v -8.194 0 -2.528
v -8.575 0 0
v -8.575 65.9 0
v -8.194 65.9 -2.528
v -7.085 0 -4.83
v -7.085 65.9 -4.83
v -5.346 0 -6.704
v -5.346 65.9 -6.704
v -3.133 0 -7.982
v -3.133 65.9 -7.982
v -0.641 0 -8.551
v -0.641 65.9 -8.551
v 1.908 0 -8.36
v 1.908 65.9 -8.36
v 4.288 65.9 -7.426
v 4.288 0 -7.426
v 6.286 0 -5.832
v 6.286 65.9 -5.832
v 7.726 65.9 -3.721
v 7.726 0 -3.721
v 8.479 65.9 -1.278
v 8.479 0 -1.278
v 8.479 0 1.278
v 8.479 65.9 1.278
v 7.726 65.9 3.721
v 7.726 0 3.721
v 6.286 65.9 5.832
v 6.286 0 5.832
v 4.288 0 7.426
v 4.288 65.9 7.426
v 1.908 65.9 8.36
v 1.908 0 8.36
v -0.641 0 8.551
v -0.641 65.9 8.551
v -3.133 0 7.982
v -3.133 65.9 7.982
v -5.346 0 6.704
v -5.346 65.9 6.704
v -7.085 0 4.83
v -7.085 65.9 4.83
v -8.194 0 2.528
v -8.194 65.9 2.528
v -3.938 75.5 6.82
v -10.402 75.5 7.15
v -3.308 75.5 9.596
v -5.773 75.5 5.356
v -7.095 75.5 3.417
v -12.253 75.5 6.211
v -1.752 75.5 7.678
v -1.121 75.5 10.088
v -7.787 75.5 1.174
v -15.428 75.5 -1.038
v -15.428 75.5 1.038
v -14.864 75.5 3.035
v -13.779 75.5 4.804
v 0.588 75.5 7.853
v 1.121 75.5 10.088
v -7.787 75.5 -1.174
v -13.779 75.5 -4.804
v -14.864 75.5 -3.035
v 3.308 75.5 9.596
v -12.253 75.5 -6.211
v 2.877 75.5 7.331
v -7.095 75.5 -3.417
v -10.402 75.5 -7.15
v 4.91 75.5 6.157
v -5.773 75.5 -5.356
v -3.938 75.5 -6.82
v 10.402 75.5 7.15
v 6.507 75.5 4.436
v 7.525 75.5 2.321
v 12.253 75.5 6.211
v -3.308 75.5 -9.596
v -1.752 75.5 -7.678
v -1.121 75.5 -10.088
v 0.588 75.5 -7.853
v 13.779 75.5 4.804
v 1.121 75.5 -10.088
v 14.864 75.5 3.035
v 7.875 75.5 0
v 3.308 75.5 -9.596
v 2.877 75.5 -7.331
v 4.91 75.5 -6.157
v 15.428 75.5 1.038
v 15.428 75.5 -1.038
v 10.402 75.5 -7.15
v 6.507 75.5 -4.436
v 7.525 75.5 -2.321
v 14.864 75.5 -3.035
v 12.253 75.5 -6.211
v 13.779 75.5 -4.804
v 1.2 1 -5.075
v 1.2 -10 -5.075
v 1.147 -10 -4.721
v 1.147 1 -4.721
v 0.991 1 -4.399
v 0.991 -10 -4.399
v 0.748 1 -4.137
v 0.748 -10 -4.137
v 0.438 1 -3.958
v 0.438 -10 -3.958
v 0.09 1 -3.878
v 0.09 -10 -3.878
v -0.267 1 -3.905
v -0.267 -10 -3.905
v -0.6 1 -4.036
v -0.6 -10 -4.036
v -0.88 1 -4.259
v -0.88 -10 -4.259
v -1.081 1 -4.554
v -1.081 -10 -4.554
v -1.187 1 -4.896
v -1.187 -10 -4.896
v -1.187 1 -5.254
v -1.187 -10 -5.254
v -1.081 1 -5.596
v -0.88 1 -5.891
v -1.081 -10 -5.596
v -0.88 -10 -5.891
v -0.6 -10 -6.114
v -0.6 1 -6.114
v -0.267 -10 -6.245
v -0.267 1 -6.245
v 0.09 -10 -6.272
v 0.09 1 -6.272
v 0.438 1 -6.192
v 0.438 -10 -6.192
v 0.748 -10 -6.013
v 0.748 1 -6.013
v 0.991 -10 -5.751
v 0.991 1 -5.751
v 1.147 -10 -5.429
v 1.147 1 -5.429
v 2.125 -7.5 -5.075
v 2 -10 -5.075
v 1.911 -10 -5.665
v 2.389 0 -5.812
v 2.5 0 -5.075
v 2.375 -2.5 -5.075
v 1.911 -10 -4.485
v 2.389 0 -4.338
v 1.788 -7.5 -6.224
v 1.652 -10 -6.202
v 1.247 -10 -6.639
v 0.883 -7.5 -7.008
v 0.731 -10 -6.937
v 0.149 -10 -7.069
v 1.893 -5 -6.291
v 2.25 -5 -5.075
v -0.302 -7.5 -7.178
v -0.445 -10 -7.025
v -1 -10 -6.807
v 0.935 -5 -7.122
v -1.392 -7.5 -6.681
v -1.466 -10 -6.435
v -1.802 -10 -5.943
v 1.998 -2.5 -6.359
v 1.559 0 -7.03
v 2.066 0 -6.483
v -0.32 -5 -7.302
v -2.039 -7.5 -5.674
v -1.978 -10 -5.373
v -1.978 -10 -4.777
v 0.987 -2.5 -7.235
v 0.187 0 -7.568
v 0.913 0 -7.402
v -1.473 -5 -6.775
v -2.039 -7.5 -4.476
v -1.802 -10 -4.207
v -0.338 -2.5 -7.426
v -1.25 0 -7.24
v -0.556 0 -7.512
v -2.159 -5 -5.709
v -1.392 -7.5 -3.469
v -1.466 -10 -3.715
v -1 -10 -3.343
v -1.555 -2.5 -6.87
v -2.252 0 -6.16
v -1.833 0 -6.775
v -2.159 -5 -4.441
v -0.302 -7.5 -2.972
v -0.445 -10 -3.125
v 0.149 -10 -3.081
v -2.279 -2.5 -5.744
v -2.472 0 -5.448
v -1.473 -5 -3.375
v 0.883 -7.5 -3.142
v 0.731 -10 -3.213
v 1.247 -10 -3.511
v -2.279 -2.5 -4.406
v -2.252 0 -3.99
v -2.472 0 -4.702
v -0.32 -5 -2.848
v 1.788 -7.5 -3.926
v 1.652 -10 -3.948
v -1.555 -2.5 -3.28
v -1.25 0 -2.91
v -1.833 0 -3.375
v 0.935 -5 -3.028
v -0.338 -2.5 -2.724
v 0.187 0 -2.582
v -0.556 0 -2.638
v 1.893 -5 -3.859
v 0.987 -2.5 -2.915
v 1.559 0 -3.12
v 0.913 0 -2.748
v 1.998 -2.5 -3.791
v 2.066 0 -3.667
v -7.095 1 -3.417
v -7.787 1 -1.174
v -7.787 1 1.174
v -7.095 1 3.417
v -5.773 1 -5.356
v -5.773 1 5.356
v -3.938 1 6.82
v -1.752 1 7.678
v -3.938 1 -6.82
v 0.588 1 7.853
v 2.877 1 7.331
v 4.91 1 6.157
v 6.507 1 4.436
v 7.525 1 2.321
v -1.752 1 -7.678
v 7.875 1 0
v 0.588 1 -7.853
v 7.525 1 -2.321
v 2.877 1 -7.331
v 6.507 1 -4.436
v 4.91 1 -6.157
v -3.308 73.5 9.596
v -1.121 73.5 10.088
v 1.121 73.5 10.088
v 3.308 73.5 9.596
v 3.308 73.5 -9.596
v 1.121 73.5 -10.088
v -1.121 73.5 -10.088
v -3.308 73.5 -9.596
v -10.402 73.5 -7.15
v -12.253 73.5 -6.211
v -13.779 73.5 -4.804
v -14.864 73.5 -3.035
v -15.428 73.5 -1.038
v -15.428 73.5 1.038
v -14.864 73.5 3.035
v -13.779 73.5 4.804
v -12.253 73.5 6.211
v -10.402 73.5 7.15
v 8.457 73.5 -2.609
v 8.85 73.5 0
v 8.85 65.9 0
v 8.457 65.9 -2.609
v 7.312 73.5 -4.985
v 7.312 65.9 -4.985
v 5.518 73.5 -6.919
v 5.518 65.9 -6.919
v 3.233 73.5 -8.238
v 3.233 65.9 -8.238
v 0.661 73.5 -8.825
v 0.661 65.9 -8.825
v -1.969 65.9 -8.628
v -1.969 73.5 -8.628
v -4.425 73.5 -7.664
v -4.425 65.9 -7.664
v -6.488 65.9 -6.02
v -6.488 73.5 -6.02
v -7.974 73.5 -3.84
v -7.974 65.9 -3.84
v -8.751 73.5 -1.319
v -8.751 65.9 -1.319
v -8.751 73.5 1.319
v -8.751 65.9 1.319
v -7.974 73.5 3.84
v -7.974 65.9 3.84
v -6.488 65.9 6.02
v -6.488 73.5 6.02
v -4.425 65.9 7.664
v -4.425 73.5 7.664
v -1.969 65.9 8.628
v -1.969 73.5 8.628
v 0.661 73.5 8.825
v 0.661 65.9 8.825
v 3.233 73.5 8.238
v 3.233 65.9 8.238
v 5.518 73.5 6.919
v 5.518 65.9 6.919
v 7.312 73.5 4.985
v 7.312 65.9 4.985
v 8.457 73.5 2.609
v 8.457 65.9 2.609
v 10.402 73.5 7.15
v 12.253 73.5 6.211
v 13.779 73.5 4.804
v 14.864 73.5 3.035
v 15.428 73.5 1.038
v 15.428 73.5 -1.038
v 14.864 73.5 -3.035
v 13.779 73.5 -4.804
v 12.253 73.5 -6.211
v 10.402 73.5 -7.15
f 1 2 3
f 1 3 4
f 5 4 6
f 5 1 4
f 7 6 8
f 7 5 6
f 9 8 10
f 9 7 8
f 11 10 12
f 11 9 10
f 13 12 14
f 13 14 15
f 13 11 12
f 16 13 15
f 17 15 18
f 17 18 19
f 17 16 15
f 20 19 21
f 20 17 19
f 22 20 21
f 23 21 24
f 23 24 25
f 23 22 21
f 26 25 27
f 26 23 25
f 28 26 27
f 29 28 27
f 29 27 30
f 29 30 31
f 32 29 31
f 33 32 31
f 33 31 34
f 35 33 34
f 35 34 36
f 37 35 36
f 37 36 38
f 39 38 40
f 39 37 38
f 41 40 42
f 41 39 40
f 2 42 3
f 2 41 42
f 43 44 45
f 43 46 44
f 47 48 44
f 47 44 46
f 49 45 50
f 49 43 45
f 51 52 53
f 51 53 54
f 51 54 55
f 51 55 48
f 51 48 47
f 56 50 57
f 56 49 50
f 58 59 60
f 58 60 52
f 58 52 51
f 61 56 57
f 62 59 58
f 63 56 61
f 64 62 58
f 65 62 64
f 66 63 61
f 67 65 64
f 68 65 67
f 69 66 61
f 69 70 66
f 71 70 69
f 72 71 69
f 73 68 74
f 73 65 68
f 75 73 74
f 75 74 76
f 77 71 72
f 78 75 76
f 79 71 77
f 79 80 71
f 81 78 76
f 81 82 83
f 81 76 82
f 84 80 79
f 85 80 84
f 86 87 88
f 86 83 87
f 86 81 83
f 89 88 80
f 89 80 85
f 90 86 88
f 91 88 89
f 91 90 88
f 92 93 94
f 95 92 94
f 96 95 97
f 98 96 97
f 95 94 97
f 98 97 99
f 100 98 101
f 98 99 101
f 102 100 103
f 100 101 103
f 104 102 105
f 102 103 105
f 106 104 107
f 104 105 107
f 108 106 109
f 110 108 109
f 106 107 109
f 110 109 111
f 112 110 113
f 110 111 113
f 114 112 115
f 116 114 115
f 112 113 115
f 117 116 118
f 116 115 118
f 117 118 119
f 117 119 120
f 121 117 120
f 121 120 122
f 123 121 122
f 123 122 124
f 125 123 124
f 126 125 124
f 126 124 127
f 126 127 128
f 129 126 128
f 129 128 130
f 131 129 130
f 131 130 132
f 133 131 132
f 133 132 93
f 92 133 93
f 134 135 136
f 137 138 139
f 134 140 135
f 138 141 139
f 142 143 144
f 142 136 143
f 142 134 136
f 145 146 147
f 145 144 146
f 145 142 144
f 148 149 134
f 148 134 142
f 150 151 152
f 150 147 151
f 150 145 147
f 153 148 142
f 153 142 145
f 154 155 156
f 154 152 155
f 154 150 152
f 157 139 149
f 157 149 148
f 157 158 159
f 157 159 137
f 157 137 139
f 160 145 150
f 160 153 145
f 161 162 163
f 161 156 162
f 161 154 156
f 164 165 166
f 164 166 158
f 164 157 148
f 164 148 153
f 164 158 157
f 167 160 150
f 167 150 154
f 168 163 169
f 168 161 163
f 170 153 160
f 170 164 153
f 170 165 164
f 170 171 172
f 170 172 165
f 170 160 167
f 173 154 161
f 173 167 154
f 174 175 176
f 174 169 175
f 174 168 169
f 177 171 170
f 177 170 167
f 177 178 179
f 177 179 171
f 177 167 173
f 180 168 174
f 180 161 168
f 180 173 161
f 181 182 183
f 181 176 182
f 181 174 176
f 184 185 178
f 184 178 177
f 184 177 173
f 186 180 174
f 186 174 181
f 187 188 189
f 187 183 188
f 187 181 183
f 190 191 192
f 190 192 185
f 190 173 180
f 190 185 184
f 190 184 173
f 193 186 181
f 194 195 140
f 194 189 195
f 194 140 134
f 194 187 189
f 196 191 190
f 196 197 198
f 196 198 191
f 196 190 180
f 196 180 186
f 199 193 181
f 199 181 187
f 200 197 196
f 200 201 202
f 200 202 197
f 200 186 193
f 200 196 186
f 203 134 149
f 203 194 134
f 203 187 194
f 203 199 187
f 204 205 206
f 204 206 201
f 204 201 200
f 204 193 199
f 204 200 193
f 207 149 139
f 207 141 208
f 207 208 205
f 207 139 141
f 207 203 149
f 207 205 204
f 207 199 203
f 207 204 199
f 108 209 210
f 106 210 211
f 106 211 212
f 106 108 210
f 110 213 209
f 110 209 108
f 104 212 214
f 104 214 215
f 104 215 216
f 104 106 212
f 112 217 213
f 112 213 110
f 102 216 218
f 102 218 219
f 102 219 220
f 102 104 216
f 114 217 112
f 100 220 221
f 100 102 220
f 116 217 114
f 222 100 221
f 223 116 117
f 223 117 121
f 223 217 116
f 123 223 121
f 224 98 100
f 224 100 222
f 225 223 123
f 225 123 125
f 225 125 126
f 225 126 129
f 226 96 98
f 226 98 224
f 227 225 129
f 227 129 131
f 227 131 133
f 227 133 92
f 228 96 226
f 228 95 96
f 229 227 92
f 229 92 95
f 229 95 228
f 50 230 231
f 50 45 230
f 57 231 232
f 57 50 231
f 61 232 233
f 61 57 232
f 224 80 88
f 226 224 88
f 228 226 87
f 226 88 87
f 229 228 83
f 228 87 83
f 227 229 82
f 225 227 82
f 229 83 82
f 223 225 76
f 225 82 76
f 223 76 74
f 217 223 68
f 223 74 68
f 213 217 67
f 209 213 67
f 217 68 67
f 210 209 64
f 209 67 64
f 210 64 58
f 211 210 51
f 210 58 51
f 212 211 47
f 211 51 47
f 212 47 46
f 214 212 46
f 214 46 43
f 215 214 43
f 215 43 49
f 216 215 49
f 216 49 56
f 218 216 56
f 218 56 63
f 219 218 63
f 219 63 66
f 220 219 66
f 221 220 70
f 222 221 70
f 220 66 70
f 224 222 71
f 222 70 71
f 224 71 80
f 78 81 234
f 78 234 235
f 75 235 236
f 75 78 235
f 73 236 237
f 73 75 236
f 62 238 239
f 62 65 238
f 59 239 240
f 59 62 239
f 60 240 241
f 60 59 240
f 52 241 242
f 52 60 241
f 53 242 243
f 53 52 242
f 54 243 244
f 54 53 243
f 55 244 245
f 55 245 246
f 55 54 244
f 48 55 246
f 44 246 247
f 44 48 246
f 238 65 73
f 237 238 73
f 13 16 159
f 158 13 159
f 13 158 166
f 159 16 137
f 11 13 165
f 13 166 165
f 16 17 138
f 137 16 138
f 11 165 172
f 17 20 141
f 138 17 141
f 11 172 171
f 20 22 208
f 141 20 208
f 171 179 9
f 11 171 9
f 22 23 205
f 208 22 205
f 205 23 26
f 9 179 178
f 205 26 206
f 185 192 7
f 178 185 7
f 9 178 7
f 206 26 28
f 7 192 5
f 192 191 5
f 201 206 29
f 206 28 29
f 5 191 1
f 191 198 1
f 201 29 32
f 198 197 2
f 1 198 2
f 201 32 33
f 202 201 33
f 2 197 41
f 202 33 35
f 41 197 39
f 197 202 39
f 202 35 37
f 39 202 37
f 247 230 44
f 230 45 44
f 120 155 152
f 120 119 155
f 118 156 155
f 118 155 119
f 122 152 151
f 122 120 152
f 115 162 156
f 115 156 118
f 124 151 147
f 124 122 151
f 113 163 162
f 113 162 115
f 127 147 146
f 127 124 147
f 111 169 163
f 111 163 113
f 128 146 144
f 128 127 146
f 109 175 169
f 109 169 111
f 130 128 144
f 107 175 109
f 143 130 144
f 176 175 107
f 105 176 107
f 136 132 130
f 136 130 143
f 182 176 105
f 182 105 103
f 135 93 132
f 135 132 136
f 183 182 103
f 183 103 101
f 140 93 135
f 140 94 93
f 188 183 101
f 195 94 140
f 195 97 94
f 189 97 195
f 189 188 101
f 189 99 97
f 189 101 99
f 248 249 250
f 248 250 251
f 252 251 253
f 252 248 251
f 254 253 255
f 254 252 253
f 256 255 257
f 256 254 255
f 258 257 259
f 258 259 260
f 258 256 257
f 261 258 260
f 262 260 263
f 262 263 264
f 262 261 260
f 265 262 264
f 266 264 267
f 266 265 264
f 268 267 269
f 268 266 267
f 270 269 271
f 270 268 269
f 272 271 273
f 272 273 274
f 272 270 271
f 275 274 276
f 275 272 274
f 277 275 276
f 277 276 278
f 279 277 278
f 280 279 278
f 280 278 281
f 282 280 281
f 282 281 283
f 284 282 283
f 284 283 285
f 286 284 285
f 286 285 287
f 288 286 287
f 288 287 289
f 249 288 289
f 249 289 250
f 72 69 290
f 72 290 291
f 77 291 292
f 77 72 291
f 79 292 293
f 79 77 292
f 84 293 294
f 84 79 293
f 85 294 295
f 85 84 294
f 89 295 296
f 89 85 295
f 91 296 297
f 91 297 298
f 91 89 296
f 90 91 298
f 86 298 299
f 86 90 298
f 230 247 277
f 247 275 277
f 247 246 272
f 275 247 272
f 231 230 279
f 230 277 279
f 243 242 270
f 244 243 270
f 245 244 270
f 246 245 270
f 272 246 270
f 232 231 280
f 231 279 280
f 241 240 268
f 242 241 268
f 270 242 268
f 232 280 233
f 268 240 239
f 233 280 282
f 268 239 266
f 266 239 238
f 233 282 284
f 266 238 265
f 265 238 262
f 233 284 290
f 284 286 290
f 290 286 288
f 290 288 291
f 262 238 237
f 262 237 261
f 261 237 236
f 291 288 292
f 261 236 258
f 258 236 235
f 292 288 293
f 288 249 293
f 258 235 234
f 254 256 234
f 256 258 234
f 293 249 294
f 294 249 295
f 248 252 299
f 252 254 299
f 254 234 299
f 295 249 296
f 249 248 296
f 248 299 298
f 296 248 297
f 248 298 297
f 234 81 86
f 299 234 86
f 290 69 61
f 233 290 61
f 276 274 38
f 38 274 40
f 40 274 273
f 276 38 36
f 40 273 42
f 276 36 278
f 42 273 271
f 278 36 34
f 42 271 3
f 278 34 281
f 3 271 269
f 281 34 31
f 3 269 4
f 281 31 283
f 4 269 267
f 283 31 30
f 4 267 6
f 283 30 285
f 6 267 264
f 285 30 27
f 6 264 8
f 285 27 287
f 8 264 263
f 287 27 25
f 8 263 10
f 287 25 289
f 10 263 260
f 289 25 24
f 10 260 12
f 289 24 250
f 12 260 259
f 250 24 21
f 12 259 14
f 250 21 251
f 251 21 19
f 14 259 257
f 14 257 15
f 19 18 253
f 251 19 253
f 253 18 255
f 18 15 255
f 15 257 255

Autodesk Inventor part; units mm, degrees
ref_plane "YZ Plane" through (0, 0, 0) normal (1, 0, 0) x (0, 1, 0)
ref_plane "XZ Plane" through (0, 0, 0) normal (0, 1, 0) x (-1, 0, 0)
ref_plane "XY Plane" through (0, 0, 0) normal (0, 0, 1) x (1, 0, 0)
sketch "Sketch1" plane through (0, 0, 0) normal (0, 1, 0) x (-1, 0, 0)
  circle A0 centre (0, 0) radius 8.575
  dimension "d0" = 17.15
extrude "Extrusion1" add sketch "Sketch1" along normal blind 75.5
sketch "Sketch2" plane through (0, 75.5, 0) normal (0, 1, 0) x (1, 0, 0)
  circle A0 centre (0, 0) radius 8.85
  dimension "d3" = 17.7
extrude "Extrusion2" add sketch "Sketch2" against normal blind 9.6
sketch "Sketch3" plane through (0, 75.5, 0) normal (0, 1, 0) x (1, 0, 0)
  line L0 (-3.3083, -9.5957) -> (-10.4021, -7.15)
  arc A0 (-10.4021, 7.15) -> (-10.4021, -7.15) centre (-7.937, 0) ccw
  line L1 (-10.4021, 7.15) -> (-3.3083, 9.5957)
  arc A1 (3.3083, 9.5957) -> (-3.3083, 9.5957) centre (0, 0) ccw
  line L2 (3.3083, 9.5957) -> (10.4021, 7.15)
  arc A2 (10.4021, -7.15) -> (10.4021, 7.15) centre (7.937, 0) ccw
  line L3 (10.4021, -7.15) -> (3.3083, -9.5957)
  arc A3 (-3.3083, -9.5957) -> (3.3083, -9.5957) centre (0, 0) ccw
  line L4 (0, -10.15) -> (0, 10.15) construction
  line L5 (-15.5, 0) -> (15.5, 0) construction
  dimension "d6" = 20.3
  dimension "d7" = 31
  dimension "d8" = 14.3
extrude "Extrusion3" add sketch "Sketch3" against normal blind 2
sketch "Sketch4" plane through (0, 75.5, 0) normal (0, 1, 0) x (1, 0, 0)
  circle A0 centre (0, 0) radius 7.875
  dimension "d11" = 15.75
extrude "Extrusion4" cut sketch "Sketch4" against normal blind 74.5
sketch "Sketch5" plane through (0, 0, 0) normal (0, -1, 0) x (1, 0, 0)
  circle A0 centre (0, -5.075) radius 2.5
  point P0 (0, 0)
  dimension "d14" = 5
ref_plane "Work Plane1" through (0, -10, 0) normal (0, -1, 0) x (1, 0, 0)
sketch "Sketch6" plane through (0, -10, 0) normal (0, -1, 0) x (1, 0, 0)
  circle A0 centre (0, -5.075) radius 2
  point P0 (0, 0)
  dimension "d18" = 4
loft "Loft1" add profiles "Sketch5", "Sketch6"
sketch "Sketch7" plane through (0, -10, -5.075) normal (0, -1, 0) x (1, 0, 0)
  circle A0 centre (0, 0) radius 2 projected
  circle A1 centre (0, 0) radius 1.2
  point P0 (0, 5.075)
  dimension "d24" = 0.8
extrude "Extrusion5" cut sketch "Sketch7" against normal through all contours A1
properties part number "Syringe" material "Glass"
